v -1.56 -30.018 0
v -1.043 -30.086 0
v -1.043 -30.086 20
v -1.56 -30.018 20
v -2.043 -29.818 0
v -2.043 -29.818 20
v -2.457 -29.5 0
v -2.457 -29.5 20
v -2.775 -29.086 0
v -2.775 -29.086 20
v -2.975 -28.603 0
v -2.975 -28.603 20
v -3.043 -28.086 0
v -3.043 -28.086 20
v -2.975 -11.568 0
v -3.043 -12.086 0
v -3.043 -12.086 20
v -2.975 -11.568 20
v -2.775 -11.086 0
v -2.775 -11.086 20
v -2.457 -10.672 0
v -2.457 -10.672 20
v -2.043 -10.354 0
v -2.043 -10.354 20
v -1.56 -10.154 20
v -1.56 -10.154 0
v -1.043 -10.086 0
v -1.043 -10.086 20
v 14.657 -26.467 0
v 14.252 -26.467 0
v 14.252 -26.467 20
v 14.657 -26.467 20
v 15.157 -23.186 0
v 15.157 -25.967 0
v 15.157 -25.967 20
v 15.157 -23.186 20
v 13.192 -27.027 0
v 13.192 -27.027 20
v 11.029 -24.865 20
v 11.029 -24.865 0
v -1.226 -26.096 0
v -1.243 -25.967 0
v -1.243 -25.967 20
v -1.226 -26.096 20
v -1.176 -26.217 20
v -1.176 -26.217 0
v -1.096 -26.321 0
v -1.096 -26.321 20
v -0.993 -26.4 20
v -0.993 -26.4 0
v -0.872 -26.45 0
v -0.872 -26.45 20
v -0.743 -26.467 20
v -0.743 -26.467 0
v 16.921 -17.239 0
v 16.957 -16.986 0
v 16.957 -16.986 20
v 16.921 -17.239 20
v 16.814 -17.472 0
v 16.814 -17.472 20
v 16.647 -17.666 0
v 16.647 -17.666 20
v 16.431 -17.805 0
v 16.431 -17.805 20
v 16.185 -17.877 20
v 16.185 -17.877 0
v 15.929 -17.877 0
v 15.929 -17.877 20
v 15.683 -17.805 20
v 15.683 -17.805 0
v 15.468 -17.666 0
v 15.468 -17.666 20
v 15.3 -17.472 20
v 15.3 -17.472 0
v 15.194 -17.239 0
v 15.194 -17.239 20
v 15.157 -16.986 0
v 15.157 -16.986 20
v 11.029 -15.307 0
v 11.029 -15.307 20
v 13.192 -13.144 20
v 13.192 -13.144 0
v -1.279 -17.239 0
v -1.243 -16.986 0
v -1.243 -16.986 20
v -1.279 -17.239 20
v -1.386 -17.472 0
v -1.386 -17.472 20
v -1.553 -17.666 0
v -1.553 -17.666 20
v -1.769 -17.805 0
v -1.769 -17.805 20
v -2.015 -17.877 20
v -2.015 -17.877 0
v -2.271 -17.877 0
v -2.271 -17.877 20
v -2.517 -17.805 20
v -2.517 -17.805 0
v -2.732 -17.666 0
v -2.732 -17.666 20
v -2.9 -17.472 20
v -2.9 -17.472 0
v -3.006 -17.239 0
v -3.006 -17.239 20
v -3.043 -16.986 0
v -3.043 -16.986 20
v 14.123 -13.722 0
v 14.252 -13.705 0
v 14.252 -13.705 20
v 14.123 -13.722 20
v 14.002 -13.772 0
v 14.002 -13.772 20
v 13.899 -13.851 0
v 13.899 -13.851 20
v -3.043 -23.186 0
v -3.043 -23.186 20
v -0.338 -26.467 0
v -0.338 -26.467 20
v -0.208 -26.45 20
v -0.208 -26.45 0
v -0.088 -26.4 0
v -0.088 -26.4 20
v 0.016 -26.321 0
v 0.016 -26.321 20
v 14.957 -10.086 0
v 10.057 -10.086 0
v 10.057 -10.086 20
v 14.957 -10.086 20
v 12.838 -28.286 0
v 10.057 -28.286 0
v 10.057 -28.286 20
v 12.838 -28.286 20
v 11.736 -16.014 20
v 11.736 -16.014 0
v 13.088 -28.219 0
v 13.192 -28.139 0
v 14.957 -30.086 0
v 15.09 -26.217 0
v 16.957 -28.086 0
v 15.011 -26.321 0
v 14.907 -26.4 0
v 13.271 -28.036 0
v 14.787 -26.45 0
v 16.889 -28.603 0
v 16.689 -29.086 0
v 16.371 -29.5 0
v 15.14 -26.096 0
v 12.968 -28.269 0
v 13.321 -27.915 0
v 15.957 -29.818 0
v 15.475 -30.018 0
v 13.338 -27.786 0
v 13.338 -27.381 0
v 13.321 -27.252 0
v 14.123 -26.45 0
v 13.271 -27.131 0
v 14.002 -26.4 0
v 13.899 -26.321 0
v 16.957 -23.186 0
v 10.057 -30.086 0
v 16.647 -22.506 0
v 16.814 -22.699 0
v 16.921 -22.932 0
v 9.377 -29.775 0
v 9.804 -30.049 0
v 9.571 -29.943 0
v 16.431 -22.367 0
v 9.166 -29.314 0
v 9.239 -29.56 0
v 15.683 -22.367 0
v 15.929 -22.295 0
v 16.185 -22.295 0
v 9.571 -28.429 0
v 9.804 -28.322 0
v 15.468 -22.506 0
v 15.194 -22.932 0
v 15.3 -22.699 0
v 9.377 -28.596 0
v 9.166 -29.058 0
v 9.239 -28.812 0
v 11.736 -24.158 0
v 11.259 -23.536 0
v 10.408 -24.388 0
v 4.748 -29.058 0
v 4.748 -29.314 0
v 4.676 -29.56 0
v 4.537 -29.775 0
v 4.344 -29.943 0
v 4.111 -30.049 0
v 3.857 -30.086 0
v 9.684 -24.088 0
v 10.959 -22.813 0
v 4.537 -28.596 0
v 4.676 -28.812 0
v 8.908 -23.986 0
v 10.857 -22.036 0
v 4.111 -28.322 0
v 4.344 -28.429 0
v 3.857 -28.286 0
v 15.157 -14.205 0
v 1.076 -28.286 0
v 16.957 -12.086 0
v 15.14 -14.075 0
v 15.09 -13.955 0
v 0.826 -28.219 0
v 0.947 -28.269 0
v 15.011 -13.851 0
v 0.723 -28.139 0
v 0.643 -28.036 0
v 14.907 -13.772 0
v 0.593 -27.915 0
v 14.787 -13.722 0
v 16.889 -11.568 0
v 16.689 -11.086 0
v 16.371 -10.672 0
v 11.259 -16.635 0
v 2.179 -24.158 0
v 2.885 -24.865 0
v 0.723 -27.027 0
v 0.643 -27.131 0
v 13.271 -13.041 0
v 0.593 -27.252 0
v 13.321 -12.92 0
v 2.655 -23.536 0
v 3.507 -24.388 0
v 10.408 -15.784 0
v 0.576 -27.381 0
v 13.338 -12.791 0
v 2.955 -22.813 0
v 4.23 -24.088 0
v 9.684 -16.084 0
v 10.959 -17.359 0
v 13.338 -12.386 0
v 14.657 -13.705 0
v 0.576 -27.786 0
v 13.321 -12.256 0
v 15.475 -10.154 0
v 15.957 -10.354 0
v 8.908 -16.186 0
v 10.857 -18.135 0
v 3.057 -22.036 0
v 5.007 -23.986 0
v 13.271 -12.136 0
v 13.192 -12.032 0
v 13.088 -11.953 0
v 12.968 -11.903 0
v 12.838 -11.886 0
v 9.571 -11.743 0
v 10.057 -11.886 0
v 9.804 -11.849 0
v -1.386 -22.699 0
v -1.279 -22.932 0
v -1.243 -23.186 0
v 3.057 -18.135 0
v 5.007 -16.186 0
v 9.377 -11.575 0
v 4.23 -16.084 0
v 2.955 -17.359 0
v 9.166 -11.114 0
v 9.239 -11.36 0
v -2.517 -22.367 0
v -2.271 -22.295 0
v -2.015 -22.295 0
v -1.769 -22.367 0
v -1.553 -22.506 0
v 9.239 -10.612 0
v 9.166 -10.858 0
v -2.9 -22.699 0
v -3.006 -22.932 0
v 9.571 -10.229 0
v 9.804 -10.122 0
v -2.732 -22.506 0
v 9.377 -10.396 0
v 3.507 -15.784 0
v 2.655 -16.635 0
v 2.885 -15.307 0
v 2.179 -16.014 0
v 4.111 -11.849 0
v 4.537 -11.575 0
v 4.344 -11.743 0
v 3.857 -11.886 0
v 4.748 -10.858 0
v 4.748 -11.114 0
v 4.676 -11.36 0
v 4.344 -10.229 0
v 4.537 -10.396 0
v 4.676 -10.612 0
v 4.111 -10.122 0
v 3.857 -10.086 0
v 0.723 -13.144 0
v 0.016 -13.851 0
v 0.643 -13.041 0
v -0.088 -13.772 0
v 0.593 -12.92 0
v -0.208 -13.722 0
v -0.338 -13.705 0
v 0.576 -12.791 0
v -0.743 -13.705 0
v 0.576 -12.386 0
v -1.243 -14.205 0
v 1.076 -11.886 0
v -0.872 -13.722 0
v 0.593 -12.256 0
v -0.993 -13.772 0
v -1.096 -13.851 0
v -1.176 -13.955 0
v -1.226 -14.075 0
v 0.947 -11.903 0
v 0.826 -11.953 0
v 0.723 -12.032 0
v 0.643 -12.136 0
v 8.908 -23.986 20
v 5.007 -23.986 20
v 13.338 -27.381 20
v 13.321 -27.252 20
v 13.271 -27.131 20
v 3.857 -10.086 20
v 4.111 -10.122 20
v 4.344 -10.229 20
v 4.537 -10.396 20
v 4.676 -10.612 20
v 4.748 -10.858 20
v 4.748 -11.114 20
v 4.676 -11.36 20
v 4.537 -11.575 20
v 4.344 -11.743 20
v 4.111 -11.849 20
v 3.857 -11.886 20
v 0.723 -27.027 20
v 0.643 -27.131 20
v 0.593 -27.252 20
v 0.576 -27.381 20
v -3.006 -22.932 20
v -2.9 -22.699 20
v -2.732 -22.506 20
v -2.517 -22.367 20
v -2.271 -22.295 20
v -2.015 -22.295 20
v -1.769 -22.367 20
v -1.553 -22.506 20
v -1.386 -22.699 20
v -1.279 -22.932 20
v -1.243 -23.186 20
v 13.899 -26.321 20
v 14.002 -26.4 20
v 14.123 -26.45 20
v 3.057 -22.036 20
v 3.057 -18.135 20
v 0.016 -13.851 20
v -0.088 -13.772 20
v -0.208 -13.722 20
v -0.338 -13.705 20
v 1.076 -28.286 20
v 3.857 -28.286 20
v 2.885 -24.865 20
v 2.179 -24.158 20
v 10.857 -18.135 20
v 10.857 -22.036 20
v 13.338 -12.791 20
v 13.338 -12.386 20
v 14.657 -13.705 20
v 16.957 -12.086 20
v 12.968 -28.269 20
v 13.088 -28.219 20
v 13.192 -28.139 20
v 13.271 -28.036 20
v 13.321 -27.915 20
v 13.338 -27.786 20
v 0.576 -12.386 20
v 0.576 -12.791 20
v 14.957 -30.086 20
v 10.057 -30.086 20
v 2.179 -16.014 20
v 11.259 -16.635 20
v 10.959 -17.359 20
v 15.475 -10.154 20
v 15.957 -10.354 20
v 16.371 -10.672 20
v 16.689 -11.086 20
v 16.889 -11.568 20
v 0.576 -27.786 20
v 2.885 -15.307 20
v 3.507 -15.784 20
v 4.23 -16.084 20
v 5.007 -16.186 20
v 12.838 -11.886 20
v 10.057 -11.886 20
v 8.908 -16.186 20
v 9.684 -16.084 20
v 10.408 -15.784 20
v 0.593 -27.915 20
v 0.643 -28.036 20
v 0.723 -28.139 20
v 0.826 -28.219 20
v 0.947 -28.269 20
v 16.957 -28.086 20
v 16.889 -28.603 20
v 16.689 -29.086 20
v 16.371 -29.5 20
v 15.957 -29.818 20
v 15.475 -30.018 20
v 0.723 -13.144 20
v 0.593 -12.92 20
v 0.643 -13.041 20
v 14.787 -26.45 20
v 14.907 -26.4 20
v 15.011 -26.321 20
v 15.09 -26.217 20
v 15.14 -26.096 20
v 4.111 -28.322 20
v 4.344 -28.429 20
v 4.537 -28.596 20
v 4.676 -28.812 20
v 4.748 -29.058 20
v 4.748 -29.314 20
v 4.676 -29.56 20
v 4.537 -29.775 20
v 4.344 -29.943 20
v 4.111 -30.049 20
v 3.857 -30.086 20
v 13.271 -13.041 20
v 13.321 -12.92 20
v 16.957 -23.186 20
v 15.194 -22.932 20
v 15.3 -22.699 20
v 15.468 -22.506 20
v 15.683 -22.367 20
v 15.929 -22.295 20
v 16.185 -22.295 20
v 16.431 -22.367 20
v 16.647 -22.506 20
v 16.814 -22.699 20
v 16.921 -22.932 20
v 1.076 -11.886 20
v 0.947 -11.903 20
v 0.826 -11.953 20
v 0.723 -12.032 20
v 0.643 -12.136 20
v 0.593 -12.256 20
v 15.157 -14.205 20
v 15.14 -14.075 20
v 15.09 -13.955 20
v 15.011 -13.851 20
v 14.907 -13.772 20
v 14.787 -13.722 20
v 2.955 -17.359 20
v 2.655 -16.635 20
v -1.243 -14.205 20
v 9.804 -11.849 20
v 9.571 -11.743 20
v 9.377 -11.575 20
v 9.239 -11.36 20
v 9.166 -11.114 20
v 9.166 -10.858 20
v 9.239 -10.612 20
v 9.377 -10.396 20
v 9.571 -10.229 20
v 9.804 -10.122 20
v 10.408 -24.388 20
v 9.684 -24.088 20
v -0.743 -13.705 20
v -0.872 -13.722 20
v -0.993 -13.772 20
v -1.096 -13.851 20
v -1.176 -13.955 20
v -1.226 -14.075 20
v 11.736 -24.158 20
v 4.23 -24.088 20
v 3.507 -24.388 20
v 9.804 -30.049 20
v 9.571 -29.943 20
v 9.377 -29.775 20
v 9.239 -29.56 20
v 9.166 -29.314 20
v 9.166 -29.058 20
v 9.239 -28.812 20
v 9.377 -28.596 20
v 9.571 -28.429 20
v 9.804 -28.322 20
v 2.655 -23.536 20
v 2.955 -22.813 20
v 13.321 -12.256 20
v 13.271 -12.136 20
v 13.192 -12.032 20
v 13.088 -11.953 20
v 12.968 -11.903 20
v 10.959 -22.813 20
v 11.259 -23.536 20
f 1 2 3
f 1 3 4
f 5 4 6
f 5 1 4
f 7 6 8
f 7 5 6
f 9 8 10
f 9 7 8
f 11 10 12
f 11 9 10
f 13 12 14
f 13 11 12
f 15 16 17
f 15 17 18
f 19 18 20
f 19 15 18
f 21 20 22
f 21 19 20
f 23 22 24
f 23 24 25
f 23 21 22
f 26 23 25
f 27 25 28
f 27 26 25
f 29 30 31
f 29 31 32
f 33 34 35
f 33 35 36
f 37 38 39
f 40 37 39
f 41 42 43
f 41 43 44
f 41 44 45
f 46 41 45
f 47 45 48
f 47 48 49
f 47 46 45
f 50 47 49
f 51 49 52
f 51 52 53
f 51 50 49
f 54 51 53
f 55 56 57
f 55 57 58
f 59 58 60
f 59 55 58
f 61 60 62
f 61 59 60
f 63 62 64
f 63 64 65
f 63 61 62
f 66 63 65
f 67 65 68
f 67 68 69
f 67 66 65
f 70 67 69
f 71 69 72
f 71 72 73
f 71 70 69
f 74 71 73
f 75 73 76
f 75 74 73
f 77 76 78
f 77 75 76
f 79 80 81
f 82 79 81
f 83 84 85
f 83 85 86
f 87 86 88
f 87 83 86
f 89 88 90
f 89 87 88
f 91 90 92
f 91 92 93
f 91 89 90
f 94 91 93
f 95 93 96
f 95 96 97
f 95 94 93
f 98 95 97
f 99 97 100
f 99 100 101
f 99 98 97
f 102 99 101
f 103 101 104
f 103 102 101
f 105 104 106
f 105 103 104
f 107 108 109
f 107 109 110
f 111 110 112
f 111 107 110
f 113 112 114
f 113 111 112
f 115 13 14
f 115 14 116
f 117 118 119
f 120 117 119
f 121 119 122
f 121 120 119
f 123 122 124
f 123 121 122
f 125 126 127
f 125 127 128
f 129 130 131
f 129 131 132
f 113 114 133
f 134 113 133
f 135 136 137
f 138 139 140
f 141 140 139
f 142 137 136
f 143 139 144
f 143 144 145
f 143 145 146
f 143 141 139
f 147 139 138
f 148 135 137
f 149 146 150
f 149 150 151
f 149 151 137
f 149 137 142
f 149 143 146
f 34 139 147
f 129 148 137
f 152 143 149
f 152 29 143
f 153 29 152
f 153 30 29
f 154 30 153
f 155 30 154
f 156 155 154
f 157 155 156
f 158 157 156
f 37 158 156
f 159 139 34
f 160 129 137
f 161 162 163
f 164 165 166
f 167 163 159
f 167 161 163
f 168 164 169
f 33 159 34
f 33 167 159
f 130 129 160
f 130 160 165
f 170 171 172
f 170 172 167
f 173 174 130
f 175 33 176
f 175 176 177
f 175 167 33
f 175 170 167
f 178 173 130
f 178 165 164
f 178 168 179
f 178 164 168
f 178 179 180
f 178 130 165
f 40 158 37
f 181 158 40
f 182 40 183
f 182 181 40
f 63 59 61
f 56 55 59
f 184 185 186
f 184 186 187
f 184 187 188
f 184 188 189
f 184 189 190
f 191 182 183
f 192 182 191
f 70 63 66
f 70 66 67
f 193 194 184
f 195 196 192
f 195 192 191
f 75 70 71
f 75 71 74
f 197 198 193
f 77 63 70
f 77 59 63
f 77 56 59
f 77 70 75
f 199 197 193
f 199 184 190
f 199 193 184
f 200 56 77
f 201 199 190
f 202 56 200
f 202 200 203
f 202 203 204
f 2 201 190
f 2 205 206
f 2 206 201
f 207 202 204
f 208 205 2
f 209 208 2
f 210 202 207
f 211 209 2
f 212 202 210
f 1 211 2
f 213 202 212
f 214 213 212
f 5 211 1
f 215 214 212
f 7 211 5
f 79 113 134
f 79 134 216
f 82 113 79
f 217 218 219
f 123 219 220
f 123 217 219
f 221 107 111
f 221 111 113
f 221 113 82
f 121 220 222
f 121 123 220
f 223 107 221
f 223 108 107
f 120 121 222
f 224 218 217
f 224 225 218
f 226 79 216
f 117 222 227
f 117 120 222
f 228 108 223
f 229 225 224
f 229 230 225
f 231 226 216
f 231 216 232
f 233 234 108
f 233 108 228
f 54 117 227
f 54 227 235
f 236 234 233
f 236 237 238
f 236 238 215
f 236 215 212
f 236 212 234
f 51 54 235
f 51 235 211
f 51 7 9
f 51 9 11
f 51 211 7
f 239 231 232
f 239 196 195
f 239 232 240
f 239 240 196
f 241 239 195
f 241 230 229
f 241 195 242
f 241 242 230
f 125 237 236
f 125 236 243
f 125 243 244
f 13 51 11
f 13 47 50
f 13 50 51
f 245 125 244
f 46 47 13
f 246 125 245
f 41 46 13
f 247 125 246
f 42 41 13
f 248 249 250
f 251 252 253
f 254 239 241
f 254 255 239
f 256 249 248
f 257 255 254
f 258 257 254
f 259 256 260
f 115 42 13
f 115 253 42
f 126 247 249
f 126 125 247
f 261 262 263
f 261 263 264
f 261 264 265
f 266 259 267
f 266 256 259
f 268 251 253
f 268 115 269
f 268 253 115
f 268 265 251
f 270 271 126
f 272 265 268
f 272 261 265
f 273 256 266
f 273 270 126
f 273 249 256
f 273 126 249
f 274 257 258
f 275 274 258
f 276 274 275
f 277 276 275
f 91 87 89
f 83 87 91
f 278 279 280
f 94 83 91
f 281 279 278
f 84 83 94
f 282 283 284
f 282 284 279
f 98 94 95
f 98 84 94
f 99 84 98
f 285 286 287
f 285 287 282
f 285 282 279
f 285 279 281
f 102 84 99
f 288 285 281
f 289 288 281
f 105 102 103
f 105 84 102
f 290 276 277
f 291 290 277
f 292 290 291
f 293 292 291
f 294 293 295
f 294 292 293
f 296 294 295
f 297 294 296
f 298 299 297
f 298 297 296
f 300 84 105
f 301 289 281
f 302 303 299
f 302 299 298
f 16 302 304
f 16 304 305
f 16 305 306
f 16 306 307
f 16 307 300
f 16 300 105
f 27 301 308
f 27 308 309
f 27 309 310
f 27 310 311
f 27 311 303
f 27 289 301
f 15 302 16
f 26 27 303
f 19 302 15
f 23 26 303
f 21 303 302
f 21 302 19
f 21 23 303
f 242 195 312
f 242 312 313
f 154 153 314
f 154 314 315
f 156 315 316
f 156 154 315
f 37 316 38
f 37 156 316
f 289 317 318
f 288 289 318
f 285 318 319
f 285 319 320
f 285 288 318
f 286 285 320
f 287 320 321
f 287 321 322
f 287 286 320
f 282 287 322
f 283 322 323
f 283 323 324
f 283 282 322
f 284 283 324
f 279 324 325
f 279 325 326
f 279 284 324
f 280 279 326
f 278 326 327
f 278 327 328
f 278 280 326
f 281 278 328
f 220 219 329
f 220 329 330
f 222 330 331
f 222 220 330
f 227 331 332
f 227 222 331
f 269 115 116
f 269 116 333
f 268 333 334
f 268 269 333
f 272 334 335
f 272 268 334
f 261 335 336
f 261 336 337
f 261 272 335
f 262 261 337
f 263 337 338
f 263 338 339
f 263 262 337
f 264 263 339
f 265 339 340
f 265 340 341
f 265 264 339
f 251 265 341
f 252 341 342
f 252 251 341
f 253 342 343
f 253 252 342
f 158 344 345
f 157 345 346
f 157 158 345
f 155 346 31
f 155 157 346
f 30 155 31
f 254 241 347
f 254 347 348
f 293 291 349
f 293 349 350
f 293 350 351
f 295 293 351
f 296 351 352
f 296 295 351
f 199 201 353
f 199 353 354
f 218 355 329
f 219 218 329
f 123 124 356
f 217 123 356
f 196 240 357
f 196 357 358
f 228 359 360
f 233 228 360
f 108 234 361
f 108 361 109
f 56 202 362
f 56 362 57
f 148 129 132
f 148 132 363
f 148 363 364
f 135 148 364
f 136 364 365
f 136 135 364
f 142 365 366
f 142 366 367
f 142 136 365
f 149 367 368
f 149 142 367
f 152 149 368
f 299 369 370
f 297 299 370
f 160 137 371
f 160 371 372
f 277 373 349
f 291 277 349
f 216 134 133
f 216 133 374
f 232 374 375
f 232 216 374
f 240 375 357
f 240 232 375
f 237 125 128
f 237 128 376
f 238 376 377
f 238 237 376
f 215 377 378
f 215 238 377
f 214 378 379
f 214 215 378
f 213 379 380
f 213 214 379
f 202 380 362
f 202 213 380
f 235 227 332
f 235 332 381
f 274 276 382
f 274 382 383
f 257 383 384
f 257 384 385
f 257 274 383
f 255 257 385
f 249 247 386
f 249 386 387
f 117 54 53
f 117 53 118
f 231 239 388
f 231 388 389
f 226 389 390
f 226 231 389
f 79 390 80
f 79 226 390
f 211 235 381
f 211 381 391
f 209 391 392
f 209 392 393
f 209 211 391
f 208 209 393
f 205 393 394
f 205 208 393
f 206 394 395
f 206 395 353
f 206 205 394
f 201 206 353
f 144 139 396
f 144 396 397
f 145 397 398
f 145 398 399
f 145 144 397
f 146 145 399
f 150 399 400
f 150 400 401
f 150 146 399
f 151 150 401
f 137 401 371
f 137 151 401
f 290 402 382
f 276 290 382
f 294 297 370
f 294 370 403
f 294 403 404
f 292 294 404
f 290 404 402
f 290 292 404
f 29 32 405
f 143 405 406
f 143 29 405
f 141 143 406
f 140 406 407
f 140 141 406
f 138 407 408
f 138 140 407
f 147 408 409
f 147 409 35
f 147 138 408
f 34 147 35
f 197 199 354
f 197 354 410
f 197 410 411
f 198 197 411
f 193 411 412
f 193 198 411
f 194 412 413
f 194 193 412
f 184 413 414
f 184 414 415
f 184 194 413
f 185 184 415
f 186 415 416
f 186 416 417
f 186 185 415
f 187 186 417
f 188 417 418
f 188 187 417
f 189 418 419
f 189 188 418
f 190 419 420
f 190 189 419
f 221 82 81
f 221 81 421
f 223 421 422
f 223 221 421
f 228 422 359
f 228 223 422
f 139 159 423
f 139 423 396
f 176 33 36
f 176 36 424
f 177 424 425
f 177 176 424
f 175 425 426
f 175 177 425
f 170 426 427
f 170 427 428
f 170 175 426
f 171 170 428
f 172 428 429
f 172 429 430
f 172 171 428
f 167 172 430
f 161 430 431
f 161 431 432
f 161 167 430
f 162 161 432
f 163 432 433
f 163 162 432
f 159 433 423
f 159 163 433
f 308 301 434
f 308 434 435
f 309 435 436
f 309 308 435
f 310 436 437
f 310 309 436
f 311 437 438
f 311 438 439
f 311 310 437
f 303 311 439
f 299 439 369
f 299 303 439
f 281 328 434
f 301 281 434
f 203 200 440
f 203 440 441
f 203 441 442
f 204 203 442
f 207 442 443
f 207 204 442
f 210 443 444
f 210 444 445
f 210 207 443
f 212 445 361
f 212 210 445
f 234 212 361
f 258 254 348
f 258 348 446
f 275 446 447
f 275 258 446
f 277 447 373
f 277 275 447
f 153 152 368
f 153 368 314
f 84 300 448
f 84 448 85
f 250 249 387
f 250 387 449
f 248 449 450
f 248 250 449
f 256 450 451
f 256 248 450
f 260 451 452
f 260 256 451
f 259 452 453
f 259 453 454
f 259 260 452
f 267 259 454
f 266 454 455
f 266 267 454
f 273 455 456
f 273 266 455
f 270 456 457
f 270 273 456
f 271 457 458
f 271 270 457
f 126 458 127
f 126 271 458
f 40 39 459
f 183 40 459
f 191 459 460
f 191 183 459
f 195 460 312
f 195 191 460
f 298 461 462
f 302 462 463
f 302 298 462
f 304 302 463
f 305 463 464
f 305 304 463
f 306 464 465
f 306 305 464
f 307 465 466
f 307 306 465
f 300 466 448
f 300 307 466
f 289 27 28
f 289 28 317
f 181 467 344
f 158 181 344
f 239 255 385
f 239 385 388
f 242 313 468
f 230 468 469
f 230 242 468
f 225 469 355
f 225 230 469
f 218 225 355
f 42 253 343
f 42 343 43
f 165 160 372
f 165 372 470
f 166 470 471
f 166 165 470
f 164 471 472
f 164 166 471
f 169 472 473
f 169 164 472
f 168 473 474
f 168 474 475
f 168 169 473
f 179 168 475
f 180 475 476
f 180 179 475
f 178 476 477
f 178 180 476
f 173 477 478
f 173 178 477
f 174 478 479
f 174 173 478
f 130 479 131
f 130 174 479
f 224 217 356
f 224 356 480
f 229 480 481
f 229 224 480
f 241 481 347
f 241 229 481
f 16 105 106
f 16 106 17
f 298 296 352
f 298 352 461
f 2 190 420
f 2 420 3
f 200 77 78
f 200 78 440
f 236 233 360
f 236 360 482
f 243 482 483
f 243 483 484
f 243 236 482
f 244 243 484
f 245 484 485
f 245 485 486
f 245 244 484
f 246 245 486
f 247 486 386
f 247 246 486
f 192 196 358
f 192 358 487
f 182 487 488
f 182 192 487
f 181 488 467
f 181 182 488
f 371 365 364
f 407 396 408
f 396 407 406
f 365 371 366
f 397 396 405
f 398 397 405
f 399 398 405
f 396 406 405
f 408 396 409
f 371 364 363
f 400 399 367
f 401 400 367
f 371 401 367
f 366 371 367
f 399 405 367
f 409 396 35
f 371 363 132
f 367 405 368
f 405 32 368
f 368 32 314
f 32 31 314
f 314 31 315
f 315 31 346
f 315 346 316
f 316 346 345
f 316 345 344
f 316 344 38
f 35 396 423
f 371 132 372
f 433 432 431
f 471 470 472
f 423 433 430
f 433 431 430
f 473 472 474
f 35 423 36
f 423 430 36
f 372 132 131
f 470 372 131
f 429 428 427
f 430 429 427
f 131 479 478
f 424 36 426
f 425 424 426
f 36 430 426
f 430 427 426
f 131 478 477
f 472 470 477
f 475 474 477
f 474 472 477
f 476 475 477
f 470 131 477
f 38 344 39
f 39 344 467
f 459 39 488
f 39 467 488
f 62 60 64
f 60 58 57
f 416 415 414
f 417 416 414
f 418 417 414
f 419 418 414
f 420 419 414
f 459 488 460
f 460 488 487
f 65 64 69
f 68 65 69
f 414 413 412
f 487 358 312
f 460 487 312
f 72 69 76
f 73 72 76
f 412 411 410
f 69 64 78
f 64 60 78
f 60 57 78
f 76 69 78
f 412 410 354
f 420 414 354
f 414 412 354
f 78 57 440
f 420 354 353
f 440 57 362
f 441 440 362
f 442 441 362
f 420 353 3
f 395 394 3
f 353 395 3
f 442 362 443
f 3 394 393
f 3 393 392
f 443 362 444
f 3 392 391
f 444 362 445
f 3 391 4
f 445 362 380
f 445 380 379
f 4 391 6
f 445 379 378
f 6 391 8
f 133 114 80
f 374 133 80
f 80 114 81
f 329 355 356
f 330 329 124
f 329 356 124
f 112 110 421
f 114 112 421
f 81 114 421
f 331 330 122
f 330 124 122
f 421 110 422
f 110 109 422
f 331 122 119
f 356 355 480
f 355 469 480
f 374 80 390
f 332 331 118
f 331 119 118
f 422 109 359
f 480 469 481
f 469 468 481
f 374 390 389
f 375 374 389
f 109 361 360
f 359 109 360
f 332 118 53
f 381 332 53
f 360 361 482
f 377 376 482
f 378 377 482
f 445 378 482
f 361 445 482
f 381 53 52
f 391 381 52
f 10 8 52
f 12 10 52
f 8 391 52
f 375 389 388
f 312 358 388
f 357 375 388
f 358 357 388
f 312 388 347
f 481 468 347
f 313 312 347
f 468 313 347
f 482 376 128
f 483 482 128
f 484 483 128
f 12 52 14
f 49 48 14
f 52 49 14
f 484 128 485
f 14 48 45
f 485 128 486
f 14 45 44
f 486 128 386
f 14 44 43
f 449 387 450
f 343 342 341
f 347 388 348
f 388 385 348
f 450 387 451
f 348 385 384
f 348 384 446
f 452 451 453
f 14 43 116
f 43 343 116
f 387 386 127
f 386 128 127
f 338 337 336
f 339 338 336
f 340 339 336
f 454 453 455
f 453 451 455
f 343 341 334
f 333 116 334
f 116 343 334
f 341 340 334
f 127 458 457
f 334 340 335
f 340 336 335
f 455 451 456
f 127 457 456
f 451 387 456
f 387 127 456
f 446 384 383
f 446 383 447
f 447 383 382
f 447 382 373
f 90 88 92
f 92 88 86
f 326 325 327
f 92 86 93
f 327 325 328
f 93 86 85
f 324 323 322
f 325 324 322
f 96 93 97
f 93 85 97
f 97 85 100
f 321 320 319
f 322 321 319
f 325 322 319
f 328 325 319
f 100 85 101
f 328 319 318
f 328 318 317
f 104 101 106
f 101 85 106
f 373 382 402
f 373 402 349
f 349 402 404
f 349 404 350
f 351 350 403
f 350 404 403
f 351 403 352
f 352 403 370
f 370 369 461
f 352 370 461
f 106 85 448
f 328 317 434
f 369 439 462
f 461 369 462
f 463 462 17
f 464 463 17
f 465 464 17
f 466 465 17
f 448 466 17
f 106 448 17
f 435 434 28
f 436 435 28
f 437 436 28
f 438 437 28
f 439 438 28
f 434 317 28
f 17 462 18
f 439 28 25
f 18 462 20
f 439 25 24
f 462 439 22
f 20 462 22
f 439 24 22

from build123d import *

# Parameters (mm, degrees)
EXTRUDE_1_DEPTH = 20


with BuildPart() as part:
    # 草图2 → 凸台-拉伸1 (new body)
    with BuildSketch(Plane.XY):
        with BuildLine():
            Line((-1.042752475, -10.085861632), (3.857247525, -10.085861632))
            ThreePointArc((3.857247525, -10.085861632), (4.757247525, -10.985861632), (3.857247525, -11.885861632))
            Line((3.857247525, -11.885861632), (1.076161722, -11.885861632))
            ThreePointArc((1.076161722, -11.885861632), (0.722608332, -12.032308241), (0.576161722, -12.385861632))
            Line((0.576161722, -12.385861632), (0.576161722, -12.790788968))
            ThreePointArc((0.576161722, -12.790788968), (0.614221956, -12.982130685), (0.722608332, -13.144342359))
            Line((0.722608332, -13.144342359), (2.885447948, -15.307181975))
            ThreePointArc((2.885447948, -15.307181975), (3.858717994, -15.957500229), (5.006768291, -16.185861632))
            Line((5.006768291, -16.185861632), (8.907726758, -16.185861632))
            ThreePointArc((8.907726758, -16.185861632), (10.055777055, -15.957500229), (11.029047102, -15.307181975))
            Line((11.029047102, -15.307181975), (13.191886718, -13.144342359))
            ThreePointArc((13.191886718, -13.144342359), (13.300273094, -12.982130685), (13.338333327, -12.790788968))
            Line((13.338333327, -12.790788968), (13.338333327, -12.385861632))
            ThreePointArc((13.338333327, -12.385861632), (13.191886718, -12.032308241), (12.838333327, -11.885861632))
            Line((12.838333327, -11.885861632), (10.057247525, -11.885861632))
            ThreePointArc((10.057247525, -11.885861632), (9.157247525, -10.985861632), (10.057247525, -10.085861632))
            Line((10.057247525, -10.085861632), (14.957247525, -10.085861632))
            ThreePointArc((14.957247525, -10.085861632), (16.371461087, -10.671648069), (16.957247525, -12.085861632))
            Line((16.957247525, -12.085861632), (16.957247525, -16.985861632))
            ThreePointArc((16.957247525, -16.985861632), (16.057247525, -17.885861632), (15.157247525, -16.985861632))
            Line((15.157247525, -16.985861632), (15.157247525, -14.204775829))
            ThreePointArc((15.157247525, -14.204775829), (15.010800915, -13.851222438), (14.657247525, -13.704775829))
            Line((14.657247525, -13.704775829), (14.252320188, -13.704775829))
            ThreePointArc((14.252320188, -13.704775829), (14.060978472, -13.742836063), (13.898766797, -13.851222438))
            Line((13.898766797, -13.851222438), (11.735927181, -16.014062054))
            ThreePointArc((11.735927181, -16.014062054), (11.085608927, -16.987332101), (10.857247525, -18.135382398))
            Line((10.857247525, -18.135382398), (10.857247525, -22.036340865))
            ThreePointArc((10.857247525, -22.036340865), (11.085608927, -23.184391162), (11.735927181, -24.157661209))
            Line((11.735927181, -24.157661209), (13.898766797, -26.320500825))
            ThreePointArc((13.898766797, -26.320500825), (14.060978472, -26.4288872), (14.252320188, -26.466947434))
            Line((14.252320188, -26.466947434), (14.657247525, -26.466947434))
            ThreePointArc((14.657247525, -26.466947434), (15.010800915, -26.320500825), (15.157247525, -25.966947434))
            Line((15.157247525, -25.966947434), (15.157247525, -23.185861632))
            ThreePointArc((15.157247525, -23.185861632), (16.057247525, -22.285861632), (16.957247525, -23.185861632))
            Line((16.957247525, -23.185861632), (16.957247525, -28.085861632))
            ThreePointArc((16.957247525, -28.085861632), (16.371461087, -29.500075194), (14.957247525, -30.085861632))
            Line((14.957247525, -30.085861632), (10.057247525, -30.085861632))
            ThreePointArc((10.057247525, -30.085861632), (9.157247525, -29.185861632), (10.057247525, -28.285861632))
            Line((10.057247525, -28.285861632), (12.838333327, -28.285861632))
            ThreePointArc((12.838333327, -28.285861632), (13.191886718, -28.139415022), (13.338333327, -27.785861632))
            Line((13.338333327, -27.785861632), (13.338333327, -27.380934295))
            ThreePointArc((13.338333327, -27.380934295), (13.300273094, -27.189592579), (13.191886718, -27.027380904))
            Line((13.191886718, -27.027380904), (11.029047102, -24.864541288))
            ThreePointArc((11.029047102, -24.864541288), (10.055777055, -24.214223034), (8.907726758, -23.985861632))
            Line((8.907726758, -23.985861632), (5.006768291, -23.985861632))
            ThreePointArc((5.006768291, -23.985861632), (3.858717994, -24.214223034), (2.885447948, -24.864541288))
            Line((2.885447948, -24.864541288), (0.722608332, -27.027380904))
            ThreePointArc((0.722608332, -27.027380904), (0.614221956, -27.189592579), (0.576161722, -27.380934295))
            Line((0.576161722, -27.380934295), (0.576161722, -27.785861632))
            ThreePointArc((0.576161722, -27.785861632), (0.722608332, -28.139415022), (1.076161722, -28.285861632))
            Line((1.076161722, -28.285861632), (3.857247525, -28.285861632))
            ThreePointArc((3.857247525, -28.285861632), (4.757247525, -29.185861632), (3.857247525, -30.085861632))
            Line((3.857247525, -30.085861632), (-1.042752475, -30.085861632))
            ThreePointArc((-1.042752475, -30.085861632), (-2.456966038, -29.500075194), (-3.042752475, -28.085861632))
            Line((-3.042752475, -28.085861632), (-3.042752475, -23.185861632))
            ThreePointArc((-3.042752475, -23.185861632), (-2.142752475, -22.285861632), (-1.242752475, -23.185861632))
            Line((-1.242752475, -23.185861632), (-1.242752475, -25.966947434))
            ThreePointArc((-1.242752475, -25.966947434), (-1.096305866, -26.320500825), (-0.742752475, -26.466947434))
            Line((-0.742752475, -26.466947434), (-0.337825138, -26.466947434))
            ThreePointArc((-0.337825138, -26.466947434), (-0.146483422, -26.4288872), (0.015728252, -26.320500825))
            Line((0.015728252, -26.320500825), (2.178567868, -24.157661209))
            ThreePointArc((2.178567868, -24.157661209), (2.828886122, -23.184391162), (3.057247525, -22.036340865))
            Line((3.057247525, -22.036340865), (3.057247525, -18.135382398))
            ThreePointArc((3.057247525, -18.135382398), (2.828886122, -16.987332101), (2.178567868, -16.014062054))
            Line((2.178567868, -16.014062054), (0.015728252, -13.851222438))
            ThreePointArc((0.015728252, -13.851222438), (-0.146483422, -13.742836063), (-0.337825138, -13.704775829))
            Line((-0.337825138, -13.704775829), (-0.742752475, -13.704775829))
            ThreePointArc((-0.742752475, -13.704775829), (-1.096305866, -13.851222438), (-1.242752475, -14.204775829))
            Line((-1.242752475, -14.204775829), (-1.242752475, -16.985861632))
            ThreePointArc((-1.242752475, -16.985861632), (-2.142752475, -17.885861632), (-3.042752475, -16.985861632))
            Line((-3.042752475, -16.985861632), (-3.042752475, -12.085861632))
            ThreePointArc((-3.042752475, -12.085861632), (-2.456966038, -10.671648069), (-1.042752475, -10.085861632))
        make_face()
    extrude(amount=EXTRUDE_1_DEPTH)


solid = part.part
